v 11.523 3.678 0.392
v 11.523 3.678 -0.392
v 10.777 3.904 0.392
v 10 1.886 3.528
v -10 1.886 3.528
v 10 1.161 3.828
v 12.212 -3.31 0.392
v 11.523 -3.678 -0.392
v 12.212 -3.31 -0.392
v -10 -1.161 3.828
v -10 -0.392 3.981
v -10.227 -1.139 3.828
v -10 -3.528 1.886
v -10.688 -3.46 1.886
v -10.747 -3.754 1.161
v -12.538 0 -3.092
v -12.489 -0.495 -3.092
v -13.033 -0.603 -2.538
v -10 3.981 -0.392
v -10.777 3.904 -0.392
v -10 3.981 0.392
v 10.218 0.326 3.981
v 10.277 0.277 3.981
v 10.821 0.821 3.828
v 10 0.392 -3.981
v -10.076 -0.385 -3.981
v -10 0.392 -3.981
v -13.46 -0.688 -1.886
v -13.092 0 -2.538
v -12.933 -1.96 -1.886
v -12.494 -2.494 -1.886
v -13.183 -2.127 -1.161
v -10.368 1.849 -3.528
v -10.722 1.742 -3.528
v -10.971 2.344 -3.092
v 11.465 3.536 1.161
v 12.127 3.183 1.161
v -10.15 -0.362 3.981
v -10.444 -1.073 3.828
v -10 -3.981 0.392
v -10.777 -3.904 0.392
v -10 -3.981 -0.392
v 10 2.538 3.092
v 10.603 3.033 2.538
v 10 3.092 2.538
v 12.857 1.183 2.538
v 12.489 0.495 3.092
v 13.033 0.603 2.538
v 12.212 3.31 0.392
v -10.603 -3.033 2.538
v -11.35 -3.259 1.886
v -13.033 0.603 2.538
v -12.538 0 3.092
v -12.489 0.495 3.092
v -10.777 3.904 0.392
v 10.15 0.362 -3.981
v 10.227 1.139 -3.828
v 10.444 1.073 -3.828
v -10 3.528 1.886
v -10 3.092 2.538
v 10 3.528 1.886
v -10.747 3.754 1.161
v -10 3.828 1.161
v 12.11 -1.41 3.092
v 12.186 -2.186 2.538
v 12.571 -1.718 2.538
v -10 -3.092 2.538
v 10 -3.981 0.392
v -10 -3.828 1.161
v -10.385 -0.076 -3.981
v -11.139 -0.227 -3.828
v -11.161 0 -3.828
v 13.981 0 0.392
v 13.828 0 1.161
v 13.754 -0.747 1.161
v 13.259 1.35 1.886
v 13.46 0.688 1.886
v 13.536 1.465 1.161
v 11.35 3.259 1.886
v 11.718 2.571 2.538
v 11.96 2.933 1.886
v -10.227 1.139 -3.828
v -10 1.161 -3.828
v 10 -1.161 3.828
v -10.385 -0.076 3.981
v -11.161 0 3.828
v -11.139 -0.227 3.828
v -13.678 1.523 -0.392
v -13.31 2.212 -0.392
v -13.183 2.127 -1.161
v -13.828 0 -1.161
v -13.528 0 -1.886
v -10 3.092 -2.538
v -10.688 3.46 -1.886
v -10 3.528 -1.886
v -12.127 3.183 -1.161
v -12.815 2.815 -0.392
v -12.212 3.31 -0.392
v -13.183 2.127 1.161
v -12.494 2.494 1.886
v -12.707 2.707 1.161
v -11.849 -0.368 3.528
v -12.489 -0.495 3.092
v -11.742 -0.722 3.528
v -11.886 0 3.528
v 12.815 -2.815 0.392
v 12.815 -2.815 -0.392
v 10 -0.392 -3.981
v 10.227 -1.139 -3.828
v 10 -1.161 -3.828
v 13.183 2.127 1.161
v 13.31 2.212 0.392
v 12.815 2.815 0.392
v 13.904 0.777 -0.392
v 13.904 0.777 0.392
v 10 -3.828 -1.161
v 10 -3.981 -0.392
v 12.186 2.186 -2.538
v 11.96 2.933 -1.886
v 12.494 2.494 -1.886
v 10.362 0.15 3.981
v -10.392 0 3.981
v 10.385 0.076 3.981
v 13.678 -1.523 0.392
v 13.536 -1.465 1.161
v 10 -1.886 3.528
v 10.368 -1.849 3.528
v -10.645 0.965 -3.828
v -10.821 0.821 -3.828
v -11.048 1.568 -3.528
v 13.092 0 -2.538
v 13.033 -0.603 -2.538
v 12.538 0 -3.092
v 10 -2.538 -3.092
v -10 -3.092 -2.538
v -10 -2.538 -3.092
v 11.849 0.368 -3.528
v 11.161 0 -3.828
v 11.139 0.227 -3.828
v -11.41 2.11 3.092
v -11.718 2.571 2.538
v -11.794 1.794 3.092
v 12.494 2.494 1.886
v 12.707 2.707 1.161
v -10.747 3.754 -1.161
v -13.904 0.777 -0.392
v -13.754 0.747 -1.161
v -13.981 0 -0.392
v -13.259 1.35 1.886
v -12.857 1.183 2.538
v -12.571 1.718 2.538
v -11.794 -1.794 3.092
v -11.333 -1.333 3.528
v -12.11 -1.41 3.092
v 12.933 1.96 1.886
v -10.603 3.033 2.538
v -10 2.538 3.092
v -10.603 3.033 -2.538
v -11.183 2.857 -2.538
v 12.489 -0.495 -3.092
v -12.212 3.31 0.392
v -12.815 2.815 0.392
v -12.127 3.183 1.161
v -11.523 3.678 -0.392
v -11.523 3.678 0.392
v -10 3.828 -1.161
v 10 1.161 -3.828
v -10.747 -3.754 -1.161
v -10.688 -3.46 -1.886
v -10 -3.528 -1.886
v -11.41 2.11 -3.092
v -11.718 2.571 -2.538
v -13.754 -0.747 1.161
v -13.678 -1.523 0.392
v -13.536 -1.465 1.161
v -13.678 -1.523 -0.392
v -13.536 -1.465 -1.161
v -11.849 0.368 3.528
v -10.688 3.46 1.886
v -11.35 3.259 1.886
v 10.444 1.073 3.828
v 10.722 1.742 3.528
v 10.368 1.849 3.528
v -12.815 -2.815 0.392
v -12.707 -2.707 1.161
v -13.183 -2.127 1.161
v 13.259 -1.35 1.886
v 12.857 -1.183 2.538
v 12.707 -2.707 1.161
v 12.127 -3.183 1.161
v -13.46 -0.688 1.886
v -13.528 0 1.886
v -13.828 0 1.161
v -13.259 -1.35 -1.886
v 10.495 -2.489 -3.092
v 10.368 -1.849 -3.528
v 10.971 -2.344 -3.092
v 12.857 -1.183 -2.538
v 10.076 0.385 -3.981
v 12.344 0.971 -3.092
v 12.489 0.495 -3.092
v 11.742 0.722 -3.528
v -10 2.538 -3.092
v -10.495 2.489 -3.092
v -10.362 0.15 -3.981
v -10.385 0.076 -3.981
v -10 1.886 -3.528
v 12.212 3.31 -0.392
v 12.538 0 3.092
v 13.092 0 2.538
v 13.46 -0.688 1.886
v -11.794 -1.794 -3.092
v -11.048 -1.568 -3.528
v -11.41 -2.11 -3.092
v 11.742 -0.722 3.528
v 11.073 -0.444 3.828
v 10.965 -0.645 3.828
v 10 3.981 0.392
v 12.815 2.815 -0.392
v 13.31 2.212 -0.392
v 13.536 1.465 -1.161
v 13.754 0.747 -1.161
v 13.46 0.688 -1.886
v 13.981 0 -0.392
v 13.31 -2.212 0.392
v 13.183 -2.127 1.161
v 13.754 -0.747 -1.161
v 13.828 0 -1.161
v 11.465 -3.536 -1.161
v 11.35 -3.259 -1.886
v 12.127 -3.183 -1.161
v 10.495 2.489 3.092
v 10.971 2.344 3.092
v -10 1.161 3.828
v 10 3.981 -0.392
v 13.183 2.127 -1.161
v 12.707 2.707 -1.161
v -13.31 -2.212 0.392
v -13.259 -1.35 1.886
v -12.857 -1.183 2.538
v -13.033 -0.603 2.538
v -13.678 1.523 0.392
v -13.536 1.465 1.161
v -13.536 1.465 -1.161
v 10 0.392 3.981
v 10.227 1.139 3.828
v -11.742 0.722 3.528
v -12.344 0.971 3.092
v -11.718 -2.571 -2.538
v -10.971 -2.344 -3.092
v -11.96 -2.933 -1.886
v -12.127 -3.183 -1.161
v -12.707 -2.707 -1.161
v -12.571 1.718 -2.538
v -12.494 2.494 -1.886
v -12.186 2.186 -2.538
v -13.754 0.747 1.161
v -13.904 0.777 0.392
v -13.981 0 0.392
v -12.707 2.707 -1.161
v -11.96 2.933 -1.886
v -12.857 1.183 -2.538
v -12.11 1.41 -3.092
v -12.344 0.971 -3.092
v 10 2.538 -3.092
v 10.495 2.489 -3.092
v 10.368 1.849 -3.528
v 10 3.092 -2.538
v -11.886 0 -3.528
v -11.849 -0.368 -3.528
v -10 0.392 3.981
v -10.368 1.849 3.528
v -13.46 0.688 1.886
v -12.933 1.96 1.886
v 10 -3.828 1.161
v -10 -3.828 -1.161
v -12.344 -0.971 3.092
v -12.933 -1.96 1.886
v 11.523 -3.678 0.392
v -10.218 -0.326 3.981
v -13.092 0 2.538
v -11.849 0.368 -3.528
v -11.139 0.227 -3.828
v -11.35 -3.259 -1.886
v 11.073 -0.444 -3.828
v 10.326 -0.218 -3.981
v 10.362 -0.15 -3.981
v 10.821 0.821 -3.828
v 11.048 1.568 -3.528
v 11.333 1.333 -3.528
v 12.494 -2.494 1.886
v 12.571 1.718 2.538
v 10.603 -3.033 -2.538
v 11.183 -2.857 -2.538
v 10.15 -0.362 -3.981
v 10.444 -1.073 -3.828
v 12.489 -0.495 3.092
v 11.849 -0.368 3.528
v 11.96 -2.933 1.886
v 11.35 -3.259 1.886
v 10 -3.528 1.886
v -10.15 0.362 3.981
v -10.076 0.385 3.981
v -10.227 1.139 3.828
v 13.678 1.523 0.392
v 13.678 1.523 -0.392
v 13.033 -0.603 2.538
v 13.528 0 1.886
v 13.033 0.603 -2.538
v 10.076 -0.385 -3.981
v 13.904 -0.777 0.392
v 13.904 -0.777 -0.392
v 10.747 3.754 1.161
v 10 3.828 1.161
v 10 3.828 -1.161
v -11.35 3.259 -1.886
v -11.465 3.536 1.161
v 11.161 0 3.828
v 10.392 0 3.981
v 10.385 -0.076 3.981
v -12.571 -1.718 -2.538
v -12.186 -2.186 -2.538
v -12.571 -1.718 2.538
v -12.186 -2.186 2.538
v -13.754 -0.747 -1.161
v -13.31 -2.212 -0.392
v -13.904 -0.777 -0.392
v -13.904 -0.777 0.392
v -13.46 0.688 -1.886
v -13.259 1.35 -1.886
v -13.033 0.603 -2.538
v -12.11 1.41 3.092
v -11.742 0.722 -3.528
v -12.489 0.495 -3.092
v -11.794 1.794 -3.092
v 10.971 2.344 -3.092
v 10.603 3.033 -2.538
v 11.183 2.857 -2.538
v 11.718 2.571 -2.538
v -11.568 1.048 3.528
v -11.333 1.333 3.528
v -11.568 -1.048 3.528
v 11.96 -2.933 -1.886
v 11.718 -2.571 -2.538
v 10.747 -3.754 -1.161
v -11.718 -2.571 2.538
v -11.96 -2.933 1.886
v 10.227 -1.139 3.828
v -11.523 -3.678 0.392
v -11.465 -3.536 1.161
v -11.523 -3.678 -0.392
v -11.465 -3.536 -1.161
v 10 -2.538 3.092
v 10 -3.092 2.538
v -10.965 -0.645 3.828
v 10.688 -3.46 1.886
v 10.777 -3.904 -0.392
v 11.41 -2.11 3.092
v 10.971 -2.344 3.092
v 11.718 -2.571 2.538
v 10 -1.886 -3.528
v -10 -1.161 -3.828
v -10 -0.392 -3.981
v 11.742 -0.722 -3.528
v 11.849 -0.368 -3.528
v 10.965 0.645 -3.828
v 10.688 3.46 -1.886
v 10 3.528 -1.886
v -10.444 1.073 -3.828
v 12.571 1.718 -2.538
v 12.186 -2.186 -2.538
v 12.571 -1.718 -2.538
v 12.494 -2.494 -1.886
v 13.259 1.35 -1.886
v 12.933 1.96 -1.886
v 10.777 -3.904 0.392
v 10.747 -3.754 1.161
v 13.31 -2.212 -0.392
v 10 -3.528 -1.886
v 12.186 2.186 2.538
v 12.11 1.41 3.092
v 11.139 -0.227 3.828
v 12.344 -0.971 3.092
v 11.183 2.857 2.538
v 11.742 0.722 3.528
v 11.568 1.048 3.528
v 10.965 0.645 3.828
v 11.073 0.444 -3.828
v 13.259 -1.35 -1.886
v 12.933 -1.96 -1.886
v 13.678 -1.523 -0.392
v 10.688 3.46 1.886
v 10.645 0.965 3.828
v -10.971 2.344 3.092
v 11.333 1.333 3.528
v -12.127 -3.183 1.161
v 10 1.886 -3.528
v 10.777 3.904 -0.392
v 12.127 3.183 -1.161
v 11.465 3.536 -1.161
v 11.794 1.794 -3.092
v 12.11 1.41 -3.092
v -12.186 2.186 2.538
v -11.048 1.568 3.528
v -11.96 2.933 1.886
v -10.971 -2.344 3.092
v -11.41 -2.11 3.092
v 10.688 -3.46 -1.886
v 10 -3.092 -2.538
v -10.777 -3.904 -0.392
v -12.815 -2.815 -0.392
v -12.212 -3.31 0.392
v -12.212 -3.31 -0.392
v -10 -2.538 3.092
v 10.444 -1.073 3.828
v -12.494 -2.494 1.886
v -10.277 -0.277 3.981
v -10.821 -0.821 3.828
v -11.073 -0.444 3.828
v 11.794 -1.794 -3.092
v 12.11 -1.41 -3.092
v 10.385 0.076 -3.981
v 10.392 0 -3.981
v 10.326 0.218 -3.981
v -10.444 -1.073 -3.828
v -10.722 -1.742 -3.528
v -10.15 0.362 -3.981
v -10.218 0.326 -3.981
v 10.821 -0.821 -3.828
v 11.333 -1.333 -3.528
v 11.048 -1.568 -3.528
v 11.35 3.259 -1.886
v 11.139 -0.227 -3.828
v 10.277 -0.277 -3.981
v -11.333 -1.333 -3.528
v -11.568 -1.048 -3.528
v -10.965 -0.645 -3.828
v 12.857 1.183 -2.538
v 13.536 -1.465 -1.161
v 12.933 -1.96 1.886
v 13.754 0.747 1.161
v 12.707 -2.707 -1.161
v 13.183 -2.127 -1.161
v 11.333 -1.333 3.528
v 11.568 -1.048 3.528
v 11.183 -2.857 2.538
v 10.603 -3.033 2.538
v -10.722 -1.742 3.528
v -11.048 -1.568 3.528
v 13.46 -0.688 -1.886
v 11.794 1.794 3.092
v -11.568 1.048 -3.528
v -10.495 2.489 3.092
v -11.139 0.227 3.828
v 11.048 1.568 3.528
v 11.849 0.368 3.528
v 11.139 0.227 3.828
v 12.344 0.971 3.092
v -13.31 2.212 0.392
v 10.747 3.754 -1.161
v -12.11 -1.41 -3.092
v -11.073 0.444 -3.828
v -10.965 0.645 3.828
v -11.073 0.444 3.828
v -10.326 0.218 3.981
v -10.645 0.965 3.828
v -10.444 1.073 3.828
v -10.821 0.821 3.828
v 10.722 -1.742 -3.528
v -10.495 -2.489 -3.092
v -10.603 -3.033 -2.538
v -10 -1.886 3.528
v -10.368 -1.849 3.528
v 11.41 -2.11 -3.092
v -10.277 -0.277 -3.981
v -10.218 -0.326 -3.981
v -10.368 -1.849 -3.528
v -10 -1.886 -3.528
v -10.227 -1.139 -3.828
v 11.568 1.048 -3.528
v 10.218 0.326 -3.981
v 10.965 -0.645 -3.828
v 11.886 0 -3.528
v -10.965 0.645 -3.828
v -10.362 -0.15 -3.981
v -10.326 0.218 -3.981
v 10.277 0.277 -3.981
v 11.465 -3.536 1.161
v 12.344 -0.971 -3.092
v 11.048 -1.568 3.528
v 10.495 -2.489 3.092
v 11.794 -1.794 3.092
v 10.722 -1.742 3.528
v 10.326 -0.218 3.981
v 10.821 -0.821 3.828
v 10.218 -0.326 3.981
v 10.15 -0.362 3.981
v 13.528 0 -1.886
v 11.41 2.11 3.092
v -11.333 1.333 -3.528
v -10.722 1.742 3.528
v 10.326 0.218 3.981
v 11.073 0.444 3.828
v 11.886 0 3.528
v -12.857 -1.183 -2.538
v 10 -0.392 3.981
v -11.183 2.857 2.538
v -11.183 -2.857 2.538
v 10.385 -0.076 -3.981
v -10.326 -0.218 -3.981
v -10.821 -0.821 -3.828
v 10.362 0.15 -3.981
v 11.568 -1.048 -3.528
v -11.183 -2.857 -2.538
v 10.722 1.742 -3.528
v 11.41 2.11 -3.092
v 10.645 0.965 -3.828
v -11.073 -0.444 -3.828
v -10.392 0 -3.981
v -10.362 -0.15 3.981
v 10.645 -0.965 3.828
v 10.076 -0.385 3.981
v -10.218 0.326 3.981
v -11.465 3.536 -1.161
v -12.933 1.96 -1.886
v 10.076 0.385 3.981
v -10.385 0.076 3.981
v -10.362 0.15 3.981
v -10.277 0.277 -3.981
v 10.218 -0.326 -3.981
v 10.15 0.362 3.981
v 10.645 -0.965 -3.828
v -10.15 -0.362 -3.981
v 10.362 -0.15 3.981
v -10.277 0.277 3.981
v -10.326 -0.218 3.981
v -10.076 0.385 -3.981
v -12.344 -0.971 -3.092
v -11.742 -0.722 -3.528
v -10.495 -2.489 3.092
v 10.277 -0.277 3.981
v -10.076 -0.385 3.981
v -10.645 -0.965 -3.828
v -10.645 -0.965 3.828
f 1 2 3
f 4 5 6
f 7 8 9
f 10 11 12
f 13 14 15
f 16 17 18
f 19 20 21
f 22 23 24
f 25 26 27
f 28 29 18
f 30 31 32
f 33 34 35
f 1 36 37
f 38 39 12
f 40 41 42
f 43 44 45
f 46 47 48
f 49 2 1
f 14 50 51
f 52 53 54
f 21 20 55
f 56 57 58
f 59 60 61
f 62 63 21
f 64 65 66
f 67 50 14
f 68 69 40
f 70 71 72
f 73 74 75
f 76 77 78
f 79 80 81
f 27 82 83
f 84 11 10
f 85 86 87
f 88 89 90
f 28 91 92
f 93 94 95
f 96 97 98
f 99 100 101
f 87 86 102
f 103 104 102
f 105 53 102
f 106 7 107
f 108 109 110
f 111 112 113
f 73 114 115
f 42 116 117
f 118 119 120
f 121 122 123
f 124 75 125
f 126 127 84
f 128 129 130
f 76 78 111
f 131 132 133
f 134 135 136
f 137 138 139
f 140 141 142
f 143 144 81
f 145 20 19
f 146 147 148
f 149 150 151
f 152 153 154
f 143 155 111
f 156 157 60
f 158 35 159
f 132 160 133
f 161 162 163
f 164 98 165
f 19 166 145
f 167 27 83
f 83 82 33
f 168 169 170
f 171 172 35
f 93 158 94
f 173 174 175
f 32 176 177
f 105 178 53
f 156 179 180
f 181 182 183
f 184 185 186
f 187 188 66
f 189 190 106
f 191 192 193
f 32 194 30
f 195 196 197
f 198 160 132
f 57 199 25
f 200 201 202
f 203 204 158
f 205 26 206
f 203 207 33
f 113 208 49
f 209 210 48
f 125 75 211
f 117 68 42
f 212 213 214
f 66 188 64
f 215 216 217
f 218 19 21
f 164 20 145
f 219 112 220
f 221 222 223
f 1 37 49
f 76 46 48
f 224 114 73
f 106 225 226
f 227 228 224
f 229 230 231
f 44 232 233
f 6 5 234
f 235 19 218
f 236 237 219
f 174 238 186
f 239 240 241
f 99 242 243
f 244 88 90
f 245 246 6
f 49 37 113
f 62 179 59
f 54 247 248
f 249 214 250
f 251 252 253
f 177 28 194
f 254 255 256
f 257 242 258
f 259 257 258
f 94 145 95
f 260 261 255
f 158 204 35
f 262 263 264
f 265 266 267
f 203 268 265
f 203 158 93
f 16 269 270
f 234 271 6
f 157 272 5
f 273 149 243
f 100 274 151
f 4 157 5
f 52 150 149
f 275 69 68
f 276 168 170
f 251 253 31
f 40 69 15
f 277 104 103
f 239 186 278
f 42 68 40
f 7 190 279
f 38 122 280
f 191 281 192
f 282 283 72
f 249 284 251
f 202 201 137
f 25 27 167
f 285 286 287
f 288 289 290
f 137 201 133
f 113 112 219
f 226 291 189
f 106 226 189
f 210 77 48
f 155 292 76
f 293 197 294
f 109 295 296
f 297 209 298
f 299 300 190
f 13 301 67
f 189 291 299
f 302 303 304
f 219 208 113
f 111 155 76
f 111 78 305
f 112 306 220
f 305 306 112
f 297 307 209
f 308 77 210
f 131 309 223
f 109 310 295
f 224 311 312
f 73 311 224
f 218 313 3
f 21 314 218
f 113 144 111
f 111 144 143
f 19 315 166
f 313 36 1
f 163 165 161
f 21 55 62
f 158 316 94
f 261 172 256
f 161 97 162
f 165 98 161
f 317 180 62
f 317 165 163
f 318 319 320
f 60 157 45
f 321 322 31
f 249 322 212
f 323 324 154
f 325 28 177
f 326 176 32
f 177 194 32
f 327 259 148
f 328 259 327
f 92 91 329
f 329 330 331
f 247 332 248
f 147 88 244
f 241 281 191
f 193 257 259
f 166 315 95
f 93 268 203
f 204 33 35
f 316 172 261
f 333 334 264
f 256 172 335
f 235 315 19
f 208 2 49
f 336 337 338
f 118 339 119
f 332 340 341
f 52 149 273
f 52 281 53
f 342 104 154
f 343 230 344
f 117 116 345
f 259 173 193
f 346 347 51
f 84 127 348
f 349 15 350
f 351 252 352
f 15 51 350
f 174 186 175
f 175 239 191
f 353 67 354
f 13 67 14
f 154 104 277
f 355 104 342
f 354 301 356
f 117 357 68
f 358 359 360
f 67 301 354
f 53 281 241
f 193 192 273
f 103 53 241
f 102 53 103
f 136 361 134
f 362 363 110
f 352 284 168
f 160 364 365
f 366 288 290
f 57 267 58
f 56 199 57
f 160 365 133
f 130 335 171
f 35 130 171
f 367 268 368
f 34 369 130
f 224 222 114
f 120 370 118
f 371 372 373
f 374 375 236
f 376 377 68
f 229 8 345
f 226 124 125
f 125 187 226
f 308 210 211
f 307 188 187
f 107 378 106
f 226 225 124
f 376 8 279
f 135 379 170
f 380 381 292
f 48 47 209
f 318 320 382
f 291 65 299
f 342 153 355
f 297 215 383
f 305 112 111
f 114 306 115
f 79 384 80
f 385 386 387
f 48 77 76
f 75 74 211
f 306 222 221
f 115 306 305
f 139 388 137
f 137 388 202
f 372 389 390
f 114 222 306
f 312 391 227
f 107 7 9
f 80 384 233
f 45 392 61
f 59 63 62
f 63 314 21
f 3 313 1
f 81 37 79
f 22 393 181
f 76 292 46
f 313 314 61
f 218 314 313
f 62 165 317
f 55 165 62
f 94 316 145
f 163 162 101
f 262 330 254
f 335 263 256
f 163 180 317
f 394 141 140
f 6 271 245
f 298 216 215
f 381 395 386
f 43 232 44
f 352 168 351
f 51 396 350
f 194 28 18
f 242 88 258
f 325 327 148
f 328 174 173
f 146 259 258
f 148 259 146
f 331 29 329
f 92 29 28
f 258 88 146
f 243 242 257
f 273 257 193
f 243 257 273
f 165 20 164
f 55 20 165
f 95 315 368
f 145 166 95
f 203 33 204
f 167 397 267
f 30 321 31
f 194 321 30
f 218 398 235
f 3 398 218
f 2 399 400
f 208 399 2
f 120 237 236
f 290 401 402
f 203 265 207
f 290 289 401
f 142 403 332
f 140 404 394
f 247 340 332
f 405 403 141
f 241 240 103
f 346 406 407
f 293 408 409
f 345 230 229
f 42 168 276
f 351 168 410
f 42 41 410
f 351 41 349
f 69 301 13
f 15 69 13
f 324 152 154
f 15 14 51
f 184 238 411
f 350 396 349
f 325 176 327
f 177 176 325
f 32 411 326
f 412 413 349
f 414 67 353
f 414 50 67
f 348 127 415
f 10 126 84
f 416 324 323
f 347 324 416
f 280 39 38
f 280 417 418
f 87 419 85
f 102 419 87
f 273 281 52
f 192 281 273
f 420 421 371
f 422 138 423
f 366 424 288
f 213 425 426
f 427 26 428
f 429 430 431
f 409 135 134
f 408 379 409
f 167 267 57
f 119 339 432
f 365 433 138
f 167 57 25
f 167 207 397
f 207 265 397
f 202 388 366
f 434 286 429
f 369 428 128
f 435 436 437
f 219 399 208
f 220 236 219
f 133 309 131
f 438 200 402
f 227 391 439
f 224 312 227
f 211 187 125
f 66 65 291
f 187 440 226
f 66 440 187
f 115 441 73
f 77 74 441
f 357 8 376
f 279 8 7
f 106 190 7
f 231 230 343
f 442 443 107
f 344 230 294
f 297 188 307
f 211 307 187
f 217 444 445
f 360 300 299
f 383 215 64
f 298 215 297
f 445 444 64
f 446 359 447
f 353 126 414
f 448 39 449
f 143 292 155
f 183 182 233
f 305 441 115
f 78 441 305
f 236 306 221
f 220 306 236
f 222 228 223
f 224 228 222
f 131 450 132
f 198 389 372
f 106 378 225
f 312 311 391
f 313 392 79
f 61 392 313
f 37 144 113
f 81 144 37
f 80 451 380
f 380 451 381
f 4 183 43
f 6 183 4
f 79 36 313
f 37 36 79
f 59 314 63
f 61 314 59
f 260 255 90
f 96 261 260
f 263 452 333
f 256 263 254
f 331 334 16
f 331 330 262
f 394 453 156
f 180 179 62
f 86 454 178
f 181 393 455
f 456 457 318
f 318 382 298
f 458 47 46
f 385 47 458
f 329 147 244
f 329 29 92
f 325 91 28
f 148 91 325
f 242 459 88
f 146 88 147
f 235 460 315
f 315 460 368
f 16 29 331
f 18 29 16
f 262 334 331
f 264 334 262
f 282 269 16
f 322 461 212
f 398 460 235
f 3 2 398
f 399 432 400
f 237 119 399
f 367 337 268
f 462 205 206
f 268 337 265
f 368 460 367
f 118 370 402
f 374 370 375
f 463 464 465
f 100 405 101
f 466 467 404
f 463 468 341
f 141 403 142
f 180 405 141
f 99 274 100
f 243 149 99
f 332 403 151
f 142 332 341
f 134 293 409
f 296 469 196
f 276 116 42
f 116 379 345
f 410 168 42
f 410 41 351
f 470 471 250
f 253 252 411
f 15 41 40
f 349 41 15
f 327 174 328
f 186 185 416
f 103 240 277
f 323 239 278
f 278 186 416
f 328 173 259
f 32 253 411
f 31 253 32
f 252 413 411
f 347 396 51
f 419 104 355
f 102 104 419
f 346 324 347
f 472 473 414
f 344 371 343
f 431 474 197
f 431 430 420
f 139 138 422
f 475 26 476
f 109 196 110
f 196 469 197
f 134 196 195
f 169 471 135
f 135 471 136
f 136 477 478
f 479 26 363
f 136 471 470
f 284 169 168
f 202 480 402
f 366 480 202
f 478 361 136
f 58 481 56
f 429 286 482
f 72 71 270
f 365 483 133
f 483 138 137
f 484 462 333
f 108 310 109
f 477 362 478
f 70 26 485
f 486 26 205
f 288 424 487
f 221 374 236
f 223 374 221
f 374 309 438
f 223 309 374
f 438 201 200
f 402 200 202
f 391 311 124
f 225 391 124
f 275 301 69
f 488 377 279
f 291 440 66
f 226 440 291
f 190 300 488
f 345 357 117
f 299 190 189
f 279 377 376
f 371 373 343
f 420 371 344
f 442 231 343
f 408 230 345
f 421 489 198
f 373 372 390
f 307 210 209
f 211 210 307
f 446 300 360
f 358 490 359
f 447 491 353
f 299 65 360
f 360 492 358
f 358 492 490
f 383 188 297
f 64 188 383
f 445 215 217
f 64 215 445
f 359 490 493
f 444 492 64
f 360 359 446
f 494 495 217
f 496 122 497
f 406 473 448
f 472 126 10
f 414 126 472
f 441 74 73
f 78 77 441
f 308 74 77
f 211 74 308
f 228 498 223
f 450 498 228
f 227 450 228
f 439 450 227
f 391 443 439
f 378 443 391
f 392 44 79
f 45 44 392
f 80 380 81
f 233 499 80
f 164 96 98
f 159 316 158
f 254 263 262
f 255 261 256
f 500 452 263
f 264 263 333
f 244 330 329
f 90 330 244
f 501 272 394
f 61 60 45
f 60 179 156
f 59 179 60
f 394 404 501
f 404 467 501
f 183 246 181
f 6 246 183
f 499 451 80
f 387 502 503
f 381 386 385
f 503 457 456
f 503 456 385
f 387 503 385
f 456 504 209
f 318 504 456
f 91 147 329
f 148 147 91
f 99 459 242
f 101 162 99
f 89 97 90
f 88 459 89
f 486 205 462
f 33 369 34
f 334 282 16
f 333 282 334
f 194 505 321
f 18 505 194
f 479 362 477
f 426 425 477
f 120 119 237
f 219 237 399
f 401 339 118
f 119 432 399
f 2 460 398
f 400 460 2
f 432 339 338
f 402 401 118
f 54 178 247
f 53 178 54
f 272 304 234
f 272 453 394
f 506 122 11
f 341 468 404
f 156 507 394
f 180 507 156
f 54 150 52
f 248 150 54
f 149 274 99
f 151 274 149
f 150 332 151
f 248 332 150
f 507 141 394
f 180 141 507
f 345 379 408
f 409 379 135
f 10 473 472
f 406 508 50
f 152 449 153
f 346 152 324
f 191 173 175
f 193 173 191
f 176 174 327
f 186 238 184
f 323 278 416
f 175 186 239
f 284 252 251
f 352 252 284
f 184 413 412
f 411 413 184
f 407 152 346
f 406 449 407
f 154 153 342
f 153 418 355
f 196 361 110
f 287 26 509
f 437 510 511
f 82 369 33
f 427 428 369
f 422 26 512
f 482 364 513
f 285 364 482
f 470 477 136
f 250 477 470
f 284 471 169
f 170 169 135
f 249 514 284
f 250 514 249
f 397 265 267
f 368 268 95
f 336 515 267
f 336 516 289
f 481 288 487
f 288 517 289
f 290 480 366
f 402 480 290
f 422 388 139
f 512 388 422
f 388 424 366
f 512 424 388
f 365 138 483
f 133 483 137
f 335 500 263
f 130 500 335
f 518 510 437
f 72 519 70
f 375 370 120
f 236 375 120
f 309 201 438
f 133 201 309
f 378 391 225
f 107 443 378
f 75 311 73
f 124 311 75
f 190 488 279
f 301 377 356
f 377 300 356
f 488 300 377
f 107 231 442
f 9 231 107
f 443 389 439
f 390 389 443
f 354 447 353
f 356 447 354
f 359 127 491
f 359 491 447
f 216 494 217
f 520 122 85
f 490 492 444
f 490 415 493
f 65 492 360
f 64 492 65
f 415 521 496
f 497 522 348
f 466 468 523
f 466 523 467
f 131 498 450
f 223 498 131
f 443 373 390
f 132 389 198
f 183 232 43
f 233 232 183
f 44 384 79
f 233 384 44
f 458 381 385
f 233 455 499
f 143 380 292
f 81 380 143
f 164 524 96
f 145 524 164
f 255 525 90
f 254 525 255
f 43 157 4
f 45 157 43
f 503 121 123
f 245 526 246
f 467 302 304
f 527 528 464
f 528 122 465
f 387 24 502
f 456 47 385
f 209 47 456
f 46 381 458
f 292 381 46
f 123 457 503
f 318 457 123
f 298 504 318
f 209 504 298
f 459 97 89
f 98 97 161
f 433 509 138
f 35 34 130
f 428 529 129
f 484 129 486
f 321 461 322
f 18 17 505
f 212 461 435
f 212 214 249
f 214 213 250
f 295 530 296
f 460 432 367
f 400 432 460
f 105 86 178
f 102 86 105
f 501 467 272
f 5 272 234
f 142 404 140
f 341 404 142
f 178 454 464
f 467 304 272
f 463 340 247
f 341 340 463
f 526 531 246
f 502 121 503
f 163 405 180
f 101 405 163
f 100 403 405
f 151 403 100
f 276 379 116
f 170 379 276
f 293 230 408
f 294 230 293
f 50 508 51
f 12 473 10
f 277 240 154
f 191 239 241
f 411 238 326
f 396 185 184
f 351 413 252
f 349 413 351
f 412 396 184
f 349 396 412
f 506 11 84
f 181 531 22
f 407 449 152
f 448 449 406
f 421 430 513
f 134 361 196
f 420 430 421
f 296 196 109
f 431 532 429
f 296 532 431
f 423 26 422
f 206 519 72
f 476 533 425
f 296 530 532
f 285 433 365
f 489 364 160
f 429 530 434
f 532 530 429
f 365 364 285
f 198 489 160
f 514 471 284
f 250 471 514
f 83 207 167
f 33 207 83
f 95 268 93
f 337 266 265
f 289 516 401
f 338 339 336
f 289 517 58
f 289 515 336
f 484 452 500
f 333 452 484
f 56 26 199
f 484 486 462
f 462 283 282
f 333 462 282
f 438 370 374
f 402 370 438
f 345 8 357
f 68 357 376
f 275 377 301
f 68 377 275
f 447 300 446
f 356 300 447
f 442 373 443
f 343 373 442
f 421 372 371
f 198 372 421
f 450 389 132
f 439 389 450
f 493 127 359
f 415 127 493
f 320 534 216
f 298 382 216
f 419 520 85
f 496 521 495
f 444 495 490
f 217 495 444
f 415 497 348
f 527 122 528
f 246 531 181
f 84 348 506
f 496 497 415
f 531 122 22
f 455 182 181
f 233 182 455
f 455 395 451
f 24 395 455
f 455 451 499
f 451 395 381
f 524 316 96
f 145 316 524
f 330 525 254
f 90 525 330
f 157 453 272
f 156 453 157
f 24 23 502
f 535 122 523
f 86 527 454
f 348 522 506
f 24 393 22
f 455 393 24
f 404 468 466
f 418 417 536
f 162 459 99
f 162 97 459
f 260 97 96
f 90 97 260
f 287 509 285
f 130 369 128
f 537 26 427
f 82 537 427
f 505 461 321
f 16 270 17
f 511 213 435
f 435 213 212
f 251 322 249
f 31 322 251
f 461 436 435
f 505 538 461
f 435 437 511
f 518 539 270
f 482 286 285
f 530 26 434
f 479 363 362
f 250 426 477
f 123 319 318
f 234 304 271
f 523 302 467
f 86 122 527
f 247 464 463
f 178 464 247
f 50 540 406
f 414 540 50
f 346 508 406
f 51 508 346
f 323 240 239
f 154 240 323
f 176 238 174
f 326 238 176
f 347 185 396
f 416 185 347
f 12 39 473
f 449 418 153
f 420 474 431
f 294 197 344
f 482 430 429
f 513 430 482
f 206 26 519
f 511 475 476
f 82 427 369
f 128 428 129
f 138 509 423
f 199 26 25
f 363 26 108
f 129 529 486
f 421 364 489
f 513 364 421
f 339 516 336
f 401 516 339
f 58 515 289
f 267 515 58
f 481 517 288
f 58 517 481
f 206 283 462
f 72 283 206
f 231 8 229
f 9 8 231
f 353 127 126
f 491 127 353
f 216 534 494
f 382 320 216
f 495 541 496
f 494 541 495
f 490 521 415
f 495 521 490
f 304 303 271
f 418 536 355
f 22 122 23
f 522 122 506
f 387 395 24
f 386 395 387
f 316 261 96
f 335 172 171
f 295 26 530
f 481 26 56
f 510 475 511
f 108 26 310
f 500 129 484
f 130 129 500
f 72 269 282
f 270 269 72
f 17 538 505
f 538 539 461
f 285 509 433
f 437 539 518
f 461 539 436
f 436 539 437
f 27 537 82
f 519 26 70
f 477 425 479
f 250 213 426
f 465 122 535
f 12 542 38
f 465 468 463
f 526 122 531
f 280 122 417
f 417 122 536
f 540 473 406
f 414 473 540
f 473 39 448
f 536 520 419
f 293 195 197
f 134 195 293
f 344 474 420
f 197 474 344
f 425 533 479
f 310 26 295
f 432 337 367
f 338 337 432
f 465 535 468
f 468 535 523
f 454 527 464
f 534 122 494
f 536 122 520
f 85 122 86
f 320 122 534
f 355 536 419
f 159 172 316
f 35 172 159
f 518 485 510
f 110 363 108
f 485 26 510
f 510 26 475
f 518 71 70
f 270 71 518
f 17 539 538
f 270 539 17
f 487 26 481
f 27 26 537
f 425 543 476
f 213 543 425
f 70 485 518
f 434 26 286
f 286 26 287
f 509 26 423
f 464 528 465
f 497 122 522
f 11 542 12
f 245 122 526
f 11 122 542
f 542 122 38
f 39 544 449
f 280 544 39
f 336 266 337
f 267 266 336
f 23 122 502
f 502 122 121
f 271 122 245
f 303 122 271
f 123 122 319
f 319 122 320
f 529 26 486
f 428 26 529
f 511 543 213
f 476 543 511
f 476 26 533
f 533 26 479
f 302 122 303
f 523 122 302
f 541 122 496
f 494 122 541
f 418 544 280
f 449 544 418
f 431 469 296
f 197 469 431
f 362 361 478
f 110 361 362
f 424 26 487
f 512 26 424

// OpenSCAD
// Construct: hull() over 3D solids (a rounded capsule).
hull() {
    translate([-10, 0, 0]) sphere(r = 4, $fn = 32);
    translate([10, 0, 0]) sphere(r = 4, $fn = 32);
}
